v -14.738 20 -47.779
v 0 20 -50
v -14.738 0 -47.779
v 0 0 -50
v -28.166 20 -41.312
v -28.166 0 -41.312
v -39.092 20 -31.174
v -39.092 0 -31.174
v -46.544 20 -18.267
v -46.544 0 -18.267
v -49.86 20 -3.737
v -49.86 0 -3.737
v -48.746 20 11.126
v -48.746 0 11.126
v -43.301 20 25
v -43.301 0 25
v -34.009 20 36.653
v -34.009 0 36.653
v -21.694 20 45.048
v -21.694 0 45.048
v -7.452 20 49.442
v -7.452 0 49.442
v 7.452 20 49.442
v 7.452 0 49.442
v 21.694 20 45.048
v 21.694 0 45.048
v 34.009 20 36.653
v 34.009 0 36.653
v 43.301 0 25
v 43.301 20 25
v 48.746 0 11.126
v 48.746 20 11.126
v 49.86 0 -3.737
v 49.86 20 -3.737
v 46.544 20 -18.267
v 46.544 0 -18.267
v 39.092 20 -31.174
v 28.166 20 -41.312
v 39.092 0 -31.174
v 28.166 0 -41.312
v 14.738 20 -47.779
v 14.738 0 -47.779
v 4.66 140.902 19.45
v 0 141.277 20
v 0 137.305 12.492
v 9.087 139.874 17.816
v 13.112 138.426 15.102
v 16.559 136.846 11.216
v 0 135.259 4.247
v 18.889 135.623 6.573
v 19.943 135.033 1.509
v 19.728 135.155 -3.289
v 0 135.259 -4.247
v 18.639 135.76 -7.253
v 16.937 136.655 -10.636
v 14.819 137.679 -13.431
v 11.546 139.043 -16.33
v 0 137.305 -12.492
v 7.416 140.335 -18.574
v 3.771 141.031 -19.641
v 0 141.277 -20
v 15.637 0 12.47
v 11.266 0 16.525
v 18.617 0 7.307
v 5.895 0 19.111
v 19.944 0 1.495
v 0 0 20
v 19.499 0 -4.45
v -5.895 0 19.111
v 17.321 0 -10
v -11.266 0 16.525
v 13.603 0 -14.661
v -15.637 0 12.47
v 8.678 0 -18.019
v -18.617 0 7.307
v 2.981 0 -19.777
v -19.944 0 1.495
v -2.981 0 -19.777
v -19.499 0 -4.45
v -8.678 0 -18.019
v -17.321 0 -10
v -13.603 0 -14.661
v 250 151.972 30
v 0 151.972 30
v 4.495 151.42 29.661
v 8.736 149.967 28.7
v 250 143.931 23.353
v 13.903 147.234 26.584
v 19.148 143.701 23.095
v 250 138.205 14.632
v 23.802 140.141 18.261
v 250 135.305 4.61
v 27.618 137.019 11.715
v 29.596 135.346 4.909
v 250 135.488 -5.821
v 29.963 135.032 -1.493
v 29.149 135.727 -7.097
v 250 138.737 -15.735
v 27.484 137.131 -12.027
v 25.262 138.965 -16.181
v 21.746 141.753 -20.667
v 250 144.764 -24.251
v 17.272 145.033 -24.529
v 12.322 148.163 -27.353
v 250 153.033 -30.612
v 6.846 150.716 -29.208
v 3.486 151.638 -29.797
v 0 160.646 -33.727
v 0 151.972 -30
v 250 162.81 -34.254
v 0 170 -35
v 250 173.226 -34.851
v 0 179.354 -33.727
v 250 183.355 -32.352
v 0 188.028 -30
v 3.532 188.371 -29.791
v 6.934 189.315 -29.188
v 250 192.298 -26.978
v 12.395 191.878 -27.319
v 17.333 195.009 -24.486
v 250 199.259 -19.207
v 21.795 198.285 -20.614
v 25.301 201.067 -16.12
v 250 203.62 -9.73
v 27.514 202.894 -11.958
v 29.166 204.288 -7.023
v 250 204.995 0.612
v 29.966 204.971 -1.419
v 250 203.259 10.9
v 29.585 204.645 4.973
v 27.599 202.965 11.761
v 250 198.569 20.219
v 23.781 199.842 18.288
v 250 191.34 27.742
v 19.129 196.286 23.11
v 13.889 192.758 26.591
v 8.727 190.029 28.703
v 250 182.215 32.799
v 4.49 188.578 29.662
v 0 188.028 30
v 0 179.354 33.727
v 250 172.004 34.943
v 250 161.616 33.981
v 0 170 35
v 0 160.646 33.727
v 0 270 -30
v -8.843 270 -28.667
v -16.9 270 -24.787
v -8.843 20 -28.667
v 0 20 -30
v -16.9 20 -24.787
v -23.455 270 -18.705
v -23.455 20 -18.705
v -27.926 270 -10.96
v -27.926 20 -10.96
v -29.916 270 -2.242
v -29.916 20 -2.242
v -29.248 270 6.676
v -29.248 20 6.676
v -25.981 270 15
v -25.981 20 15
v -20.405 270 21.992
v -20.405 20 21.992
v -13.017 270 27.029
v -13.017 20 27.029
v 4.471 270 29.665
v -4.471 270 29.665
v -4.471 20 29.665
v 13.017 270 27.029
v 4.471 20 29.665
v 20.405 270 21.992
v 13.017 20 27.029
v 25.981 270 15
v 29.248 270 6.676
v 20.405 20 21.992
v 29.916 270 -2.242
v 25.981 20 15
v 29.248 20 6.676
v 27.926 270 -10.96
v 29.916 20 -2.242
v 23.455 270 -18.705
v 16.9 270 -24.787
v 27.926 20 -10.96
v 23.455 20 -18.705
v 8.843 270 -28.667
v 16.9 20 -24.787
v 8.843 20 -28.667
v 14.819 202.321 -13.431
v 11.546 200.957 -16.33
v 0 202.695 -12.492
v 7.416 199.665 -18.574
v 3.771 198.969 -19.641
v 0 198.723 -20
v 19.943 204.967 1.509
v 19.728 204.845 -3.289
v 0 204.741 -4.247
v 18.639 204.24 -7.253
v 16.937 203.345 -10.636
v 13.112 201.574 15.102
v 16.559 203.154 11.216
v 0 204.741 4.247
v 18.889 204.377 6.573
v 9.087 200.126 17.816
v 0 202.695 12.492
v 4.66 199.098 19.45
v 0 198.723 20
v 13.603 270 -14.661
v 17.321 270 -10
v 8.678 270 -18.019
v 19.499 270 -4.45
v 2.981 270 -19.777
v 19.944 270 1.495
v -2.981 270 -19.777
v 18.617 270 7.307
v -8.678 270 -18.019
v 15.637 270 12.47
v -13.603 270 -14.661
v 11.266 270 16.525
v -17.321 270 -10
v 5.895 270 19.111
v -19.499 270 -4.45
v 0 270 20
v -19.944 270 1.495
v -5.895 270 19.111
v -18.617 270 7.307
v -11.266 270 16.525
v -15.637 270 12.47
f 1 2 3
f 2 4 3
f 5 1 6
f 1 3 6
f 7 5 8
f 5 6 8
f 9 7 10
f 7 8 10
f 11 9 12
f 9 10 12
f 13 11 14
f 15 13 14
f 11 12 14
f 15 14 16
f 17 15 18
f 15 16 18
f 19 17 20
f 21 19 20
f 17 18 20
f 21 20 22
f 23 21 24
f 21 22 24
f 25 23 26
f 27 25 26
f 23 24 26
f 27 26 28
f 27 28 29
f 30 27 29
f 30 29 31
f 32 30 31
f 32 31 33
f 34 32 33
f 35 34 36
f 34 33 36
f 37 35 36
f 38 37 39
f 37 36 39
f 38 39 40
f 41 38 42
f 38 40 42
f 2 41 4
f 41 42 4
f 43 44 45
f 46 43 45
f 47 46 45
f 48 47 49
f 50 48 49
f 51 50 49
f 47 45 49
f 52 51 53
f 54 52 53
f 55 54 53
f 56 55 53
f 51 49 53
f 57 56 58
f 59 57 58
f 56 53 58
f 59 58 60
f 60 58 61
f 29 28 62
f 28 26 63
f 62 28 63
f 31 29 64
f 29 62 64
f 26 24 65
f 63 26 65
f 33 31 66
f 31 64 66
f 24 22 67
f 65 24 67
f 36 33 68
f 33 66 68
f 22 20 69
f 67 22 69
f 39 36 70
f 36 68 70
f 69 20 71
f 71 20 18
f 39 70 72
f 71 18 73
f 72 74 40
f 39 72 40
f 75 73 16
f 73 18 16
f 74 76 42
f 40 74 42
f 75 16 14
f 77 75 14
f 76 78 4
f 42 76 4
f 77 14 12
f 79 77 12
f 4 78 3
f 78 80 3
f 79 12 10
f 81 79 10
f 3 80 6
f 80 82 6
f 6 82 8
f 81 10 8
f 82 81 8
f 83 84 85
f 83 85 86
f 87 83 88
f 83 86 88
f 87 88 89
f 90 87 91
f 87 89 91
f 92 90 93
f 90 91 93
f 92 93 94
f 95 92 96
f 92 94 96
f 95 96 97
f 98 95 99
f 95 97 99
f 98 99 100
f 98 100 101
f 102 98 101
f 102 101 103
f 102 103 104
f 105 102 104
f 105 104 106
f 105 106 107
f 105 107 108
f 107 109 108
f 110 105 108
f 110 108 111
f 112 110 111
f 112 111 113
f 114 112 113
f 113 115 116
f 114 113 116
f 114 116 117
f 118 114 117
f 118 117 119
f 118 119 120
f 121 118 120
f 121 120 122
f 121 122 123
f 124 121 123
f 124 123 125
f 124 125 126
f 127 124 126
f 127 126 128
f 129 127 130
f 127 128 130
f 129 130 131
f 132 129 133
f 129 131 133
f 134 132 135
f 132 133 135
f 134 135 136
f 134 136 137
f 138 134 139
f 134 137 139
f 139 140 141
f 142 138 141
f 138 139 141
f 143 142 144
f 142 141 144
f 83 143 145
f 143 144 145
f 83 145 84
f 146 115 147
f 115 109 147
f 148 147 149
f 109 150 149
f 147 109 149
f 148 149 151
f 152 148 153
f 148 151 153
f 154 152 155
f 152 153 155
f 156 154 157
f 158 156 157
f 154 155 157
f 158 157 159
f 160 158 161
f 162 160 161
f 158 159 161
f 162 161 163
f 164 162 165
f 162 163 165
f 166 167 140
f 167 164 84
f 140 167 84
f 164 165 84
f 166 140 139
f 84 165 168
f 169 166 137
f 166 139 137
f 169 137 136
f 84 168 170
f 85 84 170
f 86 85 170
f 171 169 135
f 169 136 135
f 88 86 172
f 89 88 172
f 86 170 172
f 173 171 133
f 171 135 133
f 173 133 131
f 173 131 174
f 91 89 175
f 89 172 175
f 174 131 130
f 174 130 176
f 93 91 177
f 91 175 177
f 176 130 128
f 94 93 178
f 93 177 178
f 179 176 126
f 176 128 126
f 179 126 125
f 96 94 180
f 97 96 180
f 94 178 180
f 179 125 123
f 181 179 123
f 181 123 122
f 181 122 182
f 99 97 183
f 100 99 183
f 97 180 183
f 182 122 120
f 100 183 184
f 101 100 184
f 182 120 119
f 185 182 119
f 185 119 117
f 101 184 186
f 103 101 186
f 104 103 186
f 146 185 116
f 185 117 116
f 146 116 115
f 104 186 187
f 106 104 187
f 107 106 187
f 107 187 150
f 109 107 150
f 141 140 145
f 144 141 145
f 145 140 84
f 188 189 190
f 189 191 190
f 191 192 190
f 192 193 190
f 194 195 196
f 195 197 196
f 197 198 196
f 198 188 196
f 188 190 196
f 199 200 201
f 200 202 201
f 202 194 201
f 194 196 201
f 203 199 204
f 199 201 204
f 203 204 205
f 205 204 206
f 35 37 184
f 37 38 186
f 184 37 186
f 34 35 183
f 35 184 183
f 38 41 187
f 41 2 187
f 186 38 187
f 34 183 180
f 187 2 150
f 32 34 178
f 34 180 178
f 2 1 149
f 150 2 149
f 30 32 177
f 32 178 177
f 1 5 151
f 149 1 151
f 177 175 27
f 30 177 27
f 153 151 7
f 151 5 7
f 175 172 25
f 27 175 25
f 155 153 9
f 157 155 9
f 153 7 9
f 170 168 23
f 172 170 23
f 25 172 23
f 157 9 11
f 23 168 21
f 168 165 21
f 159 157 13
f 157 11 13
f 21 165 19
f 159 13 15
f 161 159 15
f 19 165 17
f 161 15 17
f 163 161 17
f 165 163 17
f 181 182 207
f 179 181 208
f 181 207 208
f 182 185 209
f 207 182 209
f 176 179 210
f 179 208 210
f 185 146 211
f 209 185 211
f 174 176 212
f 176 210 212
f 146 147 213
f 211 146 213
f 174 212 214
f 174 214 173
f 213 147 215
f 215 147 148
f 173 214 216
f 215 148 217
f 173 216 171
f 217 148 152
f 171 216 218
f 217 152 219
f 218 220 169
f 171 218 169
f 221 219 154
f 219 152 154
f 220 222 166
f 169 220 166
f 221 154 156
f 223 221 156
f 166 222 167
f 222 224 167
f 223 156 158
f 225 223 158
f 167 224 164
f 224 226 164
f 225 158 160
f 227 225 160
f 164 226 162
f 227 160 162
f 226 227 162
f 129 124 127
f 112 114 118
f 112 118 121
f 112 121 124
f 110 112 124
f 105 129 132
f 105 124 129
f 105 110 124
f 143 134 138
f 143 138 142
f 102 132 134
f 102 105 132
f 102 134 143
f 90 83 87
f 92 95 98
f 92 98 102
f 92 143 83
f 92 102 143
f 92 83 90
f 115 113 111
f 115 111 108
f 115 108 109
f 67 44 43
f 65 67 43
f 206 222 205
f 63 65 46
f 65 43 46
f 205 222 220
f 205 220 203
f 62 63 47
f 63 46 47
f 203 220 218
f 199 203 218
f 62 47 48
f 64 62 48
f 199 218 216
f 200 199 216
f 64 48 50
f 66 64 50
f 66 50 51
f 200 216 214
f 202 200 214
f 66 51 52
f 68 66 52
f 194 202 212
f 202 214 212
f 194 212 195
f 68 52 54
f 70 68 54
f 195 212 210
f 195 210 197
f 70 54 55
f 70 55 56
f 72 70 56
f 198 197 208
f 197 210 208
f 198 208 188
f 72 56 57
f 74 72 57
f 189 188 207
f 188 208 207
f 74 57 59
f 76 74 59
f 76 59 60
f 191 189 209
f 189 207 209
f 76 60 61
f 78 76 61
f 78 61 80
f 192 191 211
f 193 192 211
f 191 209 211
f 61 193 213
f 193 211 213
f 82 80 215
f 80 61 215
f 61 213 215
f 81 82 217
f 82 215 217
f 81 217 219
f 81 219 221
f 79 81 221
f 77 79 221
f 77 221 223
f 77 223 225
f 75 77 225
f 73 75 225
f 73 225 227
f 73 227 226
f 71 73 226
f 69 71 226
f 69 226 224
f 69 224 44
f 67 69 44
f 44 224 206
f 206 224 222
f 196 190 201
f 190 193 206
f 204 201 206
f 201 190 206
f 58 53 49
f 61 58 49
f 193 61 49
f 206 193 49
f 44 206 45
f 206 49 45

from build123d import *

# Parameters (mm, degrees)
SKETCH4_R           = 20
CUT_EXTRUDE1_DEPTH  = 300
SKETCH5_R           = 35
BOSS_EXTRUDE1_DEPTH = 250


with BuildPart() as part:
    # Sketch1 → Revolve1 (revolve)
    with BuildSketch(Plane.XY, mode=Mode.PRIVATE) as revolve1_sk:
        Polygon((0, 0), (0, 270), (30, 270), (30, 20), (50, 20), (50, 0), align=None)
    revolve(revolve1_sk.sketch.rotate(Axis((0, 0, 0), (0, 1, 0)), 90), axis=Axis((0, 0, 0), (0, 1, 0)))

    # Sketch4 → Cut-Extrude1 (cut)
    with BuildSketch(Plane(origin=(0, 270, 0), x_dir=(1, 0, 0), z_dir=(0, 1, 0))):
        with Locations(Location((0, 0, 0), (0, 0, 270))):
            Circle(SKETCH4_R)
    extrude(amount=-CUT_EXTRUDE1_DEPTH, mode=Mode.SUBTRACT)

    # Sketch5 → Boss-Extrude1 (add)
    with BuildSketch(Plane(origin=(0, 0, 0), x_dir=(0, 0, -1), z_dir=(1, 0, 0))):
        with Locations(Location((0, 170, 0), (0, 0, 211.002719134))):
            Circle(SKETCH5_R)
    extrude(amount=BOSS_EXTRUDE1_DEPTH)


solid = part.part
